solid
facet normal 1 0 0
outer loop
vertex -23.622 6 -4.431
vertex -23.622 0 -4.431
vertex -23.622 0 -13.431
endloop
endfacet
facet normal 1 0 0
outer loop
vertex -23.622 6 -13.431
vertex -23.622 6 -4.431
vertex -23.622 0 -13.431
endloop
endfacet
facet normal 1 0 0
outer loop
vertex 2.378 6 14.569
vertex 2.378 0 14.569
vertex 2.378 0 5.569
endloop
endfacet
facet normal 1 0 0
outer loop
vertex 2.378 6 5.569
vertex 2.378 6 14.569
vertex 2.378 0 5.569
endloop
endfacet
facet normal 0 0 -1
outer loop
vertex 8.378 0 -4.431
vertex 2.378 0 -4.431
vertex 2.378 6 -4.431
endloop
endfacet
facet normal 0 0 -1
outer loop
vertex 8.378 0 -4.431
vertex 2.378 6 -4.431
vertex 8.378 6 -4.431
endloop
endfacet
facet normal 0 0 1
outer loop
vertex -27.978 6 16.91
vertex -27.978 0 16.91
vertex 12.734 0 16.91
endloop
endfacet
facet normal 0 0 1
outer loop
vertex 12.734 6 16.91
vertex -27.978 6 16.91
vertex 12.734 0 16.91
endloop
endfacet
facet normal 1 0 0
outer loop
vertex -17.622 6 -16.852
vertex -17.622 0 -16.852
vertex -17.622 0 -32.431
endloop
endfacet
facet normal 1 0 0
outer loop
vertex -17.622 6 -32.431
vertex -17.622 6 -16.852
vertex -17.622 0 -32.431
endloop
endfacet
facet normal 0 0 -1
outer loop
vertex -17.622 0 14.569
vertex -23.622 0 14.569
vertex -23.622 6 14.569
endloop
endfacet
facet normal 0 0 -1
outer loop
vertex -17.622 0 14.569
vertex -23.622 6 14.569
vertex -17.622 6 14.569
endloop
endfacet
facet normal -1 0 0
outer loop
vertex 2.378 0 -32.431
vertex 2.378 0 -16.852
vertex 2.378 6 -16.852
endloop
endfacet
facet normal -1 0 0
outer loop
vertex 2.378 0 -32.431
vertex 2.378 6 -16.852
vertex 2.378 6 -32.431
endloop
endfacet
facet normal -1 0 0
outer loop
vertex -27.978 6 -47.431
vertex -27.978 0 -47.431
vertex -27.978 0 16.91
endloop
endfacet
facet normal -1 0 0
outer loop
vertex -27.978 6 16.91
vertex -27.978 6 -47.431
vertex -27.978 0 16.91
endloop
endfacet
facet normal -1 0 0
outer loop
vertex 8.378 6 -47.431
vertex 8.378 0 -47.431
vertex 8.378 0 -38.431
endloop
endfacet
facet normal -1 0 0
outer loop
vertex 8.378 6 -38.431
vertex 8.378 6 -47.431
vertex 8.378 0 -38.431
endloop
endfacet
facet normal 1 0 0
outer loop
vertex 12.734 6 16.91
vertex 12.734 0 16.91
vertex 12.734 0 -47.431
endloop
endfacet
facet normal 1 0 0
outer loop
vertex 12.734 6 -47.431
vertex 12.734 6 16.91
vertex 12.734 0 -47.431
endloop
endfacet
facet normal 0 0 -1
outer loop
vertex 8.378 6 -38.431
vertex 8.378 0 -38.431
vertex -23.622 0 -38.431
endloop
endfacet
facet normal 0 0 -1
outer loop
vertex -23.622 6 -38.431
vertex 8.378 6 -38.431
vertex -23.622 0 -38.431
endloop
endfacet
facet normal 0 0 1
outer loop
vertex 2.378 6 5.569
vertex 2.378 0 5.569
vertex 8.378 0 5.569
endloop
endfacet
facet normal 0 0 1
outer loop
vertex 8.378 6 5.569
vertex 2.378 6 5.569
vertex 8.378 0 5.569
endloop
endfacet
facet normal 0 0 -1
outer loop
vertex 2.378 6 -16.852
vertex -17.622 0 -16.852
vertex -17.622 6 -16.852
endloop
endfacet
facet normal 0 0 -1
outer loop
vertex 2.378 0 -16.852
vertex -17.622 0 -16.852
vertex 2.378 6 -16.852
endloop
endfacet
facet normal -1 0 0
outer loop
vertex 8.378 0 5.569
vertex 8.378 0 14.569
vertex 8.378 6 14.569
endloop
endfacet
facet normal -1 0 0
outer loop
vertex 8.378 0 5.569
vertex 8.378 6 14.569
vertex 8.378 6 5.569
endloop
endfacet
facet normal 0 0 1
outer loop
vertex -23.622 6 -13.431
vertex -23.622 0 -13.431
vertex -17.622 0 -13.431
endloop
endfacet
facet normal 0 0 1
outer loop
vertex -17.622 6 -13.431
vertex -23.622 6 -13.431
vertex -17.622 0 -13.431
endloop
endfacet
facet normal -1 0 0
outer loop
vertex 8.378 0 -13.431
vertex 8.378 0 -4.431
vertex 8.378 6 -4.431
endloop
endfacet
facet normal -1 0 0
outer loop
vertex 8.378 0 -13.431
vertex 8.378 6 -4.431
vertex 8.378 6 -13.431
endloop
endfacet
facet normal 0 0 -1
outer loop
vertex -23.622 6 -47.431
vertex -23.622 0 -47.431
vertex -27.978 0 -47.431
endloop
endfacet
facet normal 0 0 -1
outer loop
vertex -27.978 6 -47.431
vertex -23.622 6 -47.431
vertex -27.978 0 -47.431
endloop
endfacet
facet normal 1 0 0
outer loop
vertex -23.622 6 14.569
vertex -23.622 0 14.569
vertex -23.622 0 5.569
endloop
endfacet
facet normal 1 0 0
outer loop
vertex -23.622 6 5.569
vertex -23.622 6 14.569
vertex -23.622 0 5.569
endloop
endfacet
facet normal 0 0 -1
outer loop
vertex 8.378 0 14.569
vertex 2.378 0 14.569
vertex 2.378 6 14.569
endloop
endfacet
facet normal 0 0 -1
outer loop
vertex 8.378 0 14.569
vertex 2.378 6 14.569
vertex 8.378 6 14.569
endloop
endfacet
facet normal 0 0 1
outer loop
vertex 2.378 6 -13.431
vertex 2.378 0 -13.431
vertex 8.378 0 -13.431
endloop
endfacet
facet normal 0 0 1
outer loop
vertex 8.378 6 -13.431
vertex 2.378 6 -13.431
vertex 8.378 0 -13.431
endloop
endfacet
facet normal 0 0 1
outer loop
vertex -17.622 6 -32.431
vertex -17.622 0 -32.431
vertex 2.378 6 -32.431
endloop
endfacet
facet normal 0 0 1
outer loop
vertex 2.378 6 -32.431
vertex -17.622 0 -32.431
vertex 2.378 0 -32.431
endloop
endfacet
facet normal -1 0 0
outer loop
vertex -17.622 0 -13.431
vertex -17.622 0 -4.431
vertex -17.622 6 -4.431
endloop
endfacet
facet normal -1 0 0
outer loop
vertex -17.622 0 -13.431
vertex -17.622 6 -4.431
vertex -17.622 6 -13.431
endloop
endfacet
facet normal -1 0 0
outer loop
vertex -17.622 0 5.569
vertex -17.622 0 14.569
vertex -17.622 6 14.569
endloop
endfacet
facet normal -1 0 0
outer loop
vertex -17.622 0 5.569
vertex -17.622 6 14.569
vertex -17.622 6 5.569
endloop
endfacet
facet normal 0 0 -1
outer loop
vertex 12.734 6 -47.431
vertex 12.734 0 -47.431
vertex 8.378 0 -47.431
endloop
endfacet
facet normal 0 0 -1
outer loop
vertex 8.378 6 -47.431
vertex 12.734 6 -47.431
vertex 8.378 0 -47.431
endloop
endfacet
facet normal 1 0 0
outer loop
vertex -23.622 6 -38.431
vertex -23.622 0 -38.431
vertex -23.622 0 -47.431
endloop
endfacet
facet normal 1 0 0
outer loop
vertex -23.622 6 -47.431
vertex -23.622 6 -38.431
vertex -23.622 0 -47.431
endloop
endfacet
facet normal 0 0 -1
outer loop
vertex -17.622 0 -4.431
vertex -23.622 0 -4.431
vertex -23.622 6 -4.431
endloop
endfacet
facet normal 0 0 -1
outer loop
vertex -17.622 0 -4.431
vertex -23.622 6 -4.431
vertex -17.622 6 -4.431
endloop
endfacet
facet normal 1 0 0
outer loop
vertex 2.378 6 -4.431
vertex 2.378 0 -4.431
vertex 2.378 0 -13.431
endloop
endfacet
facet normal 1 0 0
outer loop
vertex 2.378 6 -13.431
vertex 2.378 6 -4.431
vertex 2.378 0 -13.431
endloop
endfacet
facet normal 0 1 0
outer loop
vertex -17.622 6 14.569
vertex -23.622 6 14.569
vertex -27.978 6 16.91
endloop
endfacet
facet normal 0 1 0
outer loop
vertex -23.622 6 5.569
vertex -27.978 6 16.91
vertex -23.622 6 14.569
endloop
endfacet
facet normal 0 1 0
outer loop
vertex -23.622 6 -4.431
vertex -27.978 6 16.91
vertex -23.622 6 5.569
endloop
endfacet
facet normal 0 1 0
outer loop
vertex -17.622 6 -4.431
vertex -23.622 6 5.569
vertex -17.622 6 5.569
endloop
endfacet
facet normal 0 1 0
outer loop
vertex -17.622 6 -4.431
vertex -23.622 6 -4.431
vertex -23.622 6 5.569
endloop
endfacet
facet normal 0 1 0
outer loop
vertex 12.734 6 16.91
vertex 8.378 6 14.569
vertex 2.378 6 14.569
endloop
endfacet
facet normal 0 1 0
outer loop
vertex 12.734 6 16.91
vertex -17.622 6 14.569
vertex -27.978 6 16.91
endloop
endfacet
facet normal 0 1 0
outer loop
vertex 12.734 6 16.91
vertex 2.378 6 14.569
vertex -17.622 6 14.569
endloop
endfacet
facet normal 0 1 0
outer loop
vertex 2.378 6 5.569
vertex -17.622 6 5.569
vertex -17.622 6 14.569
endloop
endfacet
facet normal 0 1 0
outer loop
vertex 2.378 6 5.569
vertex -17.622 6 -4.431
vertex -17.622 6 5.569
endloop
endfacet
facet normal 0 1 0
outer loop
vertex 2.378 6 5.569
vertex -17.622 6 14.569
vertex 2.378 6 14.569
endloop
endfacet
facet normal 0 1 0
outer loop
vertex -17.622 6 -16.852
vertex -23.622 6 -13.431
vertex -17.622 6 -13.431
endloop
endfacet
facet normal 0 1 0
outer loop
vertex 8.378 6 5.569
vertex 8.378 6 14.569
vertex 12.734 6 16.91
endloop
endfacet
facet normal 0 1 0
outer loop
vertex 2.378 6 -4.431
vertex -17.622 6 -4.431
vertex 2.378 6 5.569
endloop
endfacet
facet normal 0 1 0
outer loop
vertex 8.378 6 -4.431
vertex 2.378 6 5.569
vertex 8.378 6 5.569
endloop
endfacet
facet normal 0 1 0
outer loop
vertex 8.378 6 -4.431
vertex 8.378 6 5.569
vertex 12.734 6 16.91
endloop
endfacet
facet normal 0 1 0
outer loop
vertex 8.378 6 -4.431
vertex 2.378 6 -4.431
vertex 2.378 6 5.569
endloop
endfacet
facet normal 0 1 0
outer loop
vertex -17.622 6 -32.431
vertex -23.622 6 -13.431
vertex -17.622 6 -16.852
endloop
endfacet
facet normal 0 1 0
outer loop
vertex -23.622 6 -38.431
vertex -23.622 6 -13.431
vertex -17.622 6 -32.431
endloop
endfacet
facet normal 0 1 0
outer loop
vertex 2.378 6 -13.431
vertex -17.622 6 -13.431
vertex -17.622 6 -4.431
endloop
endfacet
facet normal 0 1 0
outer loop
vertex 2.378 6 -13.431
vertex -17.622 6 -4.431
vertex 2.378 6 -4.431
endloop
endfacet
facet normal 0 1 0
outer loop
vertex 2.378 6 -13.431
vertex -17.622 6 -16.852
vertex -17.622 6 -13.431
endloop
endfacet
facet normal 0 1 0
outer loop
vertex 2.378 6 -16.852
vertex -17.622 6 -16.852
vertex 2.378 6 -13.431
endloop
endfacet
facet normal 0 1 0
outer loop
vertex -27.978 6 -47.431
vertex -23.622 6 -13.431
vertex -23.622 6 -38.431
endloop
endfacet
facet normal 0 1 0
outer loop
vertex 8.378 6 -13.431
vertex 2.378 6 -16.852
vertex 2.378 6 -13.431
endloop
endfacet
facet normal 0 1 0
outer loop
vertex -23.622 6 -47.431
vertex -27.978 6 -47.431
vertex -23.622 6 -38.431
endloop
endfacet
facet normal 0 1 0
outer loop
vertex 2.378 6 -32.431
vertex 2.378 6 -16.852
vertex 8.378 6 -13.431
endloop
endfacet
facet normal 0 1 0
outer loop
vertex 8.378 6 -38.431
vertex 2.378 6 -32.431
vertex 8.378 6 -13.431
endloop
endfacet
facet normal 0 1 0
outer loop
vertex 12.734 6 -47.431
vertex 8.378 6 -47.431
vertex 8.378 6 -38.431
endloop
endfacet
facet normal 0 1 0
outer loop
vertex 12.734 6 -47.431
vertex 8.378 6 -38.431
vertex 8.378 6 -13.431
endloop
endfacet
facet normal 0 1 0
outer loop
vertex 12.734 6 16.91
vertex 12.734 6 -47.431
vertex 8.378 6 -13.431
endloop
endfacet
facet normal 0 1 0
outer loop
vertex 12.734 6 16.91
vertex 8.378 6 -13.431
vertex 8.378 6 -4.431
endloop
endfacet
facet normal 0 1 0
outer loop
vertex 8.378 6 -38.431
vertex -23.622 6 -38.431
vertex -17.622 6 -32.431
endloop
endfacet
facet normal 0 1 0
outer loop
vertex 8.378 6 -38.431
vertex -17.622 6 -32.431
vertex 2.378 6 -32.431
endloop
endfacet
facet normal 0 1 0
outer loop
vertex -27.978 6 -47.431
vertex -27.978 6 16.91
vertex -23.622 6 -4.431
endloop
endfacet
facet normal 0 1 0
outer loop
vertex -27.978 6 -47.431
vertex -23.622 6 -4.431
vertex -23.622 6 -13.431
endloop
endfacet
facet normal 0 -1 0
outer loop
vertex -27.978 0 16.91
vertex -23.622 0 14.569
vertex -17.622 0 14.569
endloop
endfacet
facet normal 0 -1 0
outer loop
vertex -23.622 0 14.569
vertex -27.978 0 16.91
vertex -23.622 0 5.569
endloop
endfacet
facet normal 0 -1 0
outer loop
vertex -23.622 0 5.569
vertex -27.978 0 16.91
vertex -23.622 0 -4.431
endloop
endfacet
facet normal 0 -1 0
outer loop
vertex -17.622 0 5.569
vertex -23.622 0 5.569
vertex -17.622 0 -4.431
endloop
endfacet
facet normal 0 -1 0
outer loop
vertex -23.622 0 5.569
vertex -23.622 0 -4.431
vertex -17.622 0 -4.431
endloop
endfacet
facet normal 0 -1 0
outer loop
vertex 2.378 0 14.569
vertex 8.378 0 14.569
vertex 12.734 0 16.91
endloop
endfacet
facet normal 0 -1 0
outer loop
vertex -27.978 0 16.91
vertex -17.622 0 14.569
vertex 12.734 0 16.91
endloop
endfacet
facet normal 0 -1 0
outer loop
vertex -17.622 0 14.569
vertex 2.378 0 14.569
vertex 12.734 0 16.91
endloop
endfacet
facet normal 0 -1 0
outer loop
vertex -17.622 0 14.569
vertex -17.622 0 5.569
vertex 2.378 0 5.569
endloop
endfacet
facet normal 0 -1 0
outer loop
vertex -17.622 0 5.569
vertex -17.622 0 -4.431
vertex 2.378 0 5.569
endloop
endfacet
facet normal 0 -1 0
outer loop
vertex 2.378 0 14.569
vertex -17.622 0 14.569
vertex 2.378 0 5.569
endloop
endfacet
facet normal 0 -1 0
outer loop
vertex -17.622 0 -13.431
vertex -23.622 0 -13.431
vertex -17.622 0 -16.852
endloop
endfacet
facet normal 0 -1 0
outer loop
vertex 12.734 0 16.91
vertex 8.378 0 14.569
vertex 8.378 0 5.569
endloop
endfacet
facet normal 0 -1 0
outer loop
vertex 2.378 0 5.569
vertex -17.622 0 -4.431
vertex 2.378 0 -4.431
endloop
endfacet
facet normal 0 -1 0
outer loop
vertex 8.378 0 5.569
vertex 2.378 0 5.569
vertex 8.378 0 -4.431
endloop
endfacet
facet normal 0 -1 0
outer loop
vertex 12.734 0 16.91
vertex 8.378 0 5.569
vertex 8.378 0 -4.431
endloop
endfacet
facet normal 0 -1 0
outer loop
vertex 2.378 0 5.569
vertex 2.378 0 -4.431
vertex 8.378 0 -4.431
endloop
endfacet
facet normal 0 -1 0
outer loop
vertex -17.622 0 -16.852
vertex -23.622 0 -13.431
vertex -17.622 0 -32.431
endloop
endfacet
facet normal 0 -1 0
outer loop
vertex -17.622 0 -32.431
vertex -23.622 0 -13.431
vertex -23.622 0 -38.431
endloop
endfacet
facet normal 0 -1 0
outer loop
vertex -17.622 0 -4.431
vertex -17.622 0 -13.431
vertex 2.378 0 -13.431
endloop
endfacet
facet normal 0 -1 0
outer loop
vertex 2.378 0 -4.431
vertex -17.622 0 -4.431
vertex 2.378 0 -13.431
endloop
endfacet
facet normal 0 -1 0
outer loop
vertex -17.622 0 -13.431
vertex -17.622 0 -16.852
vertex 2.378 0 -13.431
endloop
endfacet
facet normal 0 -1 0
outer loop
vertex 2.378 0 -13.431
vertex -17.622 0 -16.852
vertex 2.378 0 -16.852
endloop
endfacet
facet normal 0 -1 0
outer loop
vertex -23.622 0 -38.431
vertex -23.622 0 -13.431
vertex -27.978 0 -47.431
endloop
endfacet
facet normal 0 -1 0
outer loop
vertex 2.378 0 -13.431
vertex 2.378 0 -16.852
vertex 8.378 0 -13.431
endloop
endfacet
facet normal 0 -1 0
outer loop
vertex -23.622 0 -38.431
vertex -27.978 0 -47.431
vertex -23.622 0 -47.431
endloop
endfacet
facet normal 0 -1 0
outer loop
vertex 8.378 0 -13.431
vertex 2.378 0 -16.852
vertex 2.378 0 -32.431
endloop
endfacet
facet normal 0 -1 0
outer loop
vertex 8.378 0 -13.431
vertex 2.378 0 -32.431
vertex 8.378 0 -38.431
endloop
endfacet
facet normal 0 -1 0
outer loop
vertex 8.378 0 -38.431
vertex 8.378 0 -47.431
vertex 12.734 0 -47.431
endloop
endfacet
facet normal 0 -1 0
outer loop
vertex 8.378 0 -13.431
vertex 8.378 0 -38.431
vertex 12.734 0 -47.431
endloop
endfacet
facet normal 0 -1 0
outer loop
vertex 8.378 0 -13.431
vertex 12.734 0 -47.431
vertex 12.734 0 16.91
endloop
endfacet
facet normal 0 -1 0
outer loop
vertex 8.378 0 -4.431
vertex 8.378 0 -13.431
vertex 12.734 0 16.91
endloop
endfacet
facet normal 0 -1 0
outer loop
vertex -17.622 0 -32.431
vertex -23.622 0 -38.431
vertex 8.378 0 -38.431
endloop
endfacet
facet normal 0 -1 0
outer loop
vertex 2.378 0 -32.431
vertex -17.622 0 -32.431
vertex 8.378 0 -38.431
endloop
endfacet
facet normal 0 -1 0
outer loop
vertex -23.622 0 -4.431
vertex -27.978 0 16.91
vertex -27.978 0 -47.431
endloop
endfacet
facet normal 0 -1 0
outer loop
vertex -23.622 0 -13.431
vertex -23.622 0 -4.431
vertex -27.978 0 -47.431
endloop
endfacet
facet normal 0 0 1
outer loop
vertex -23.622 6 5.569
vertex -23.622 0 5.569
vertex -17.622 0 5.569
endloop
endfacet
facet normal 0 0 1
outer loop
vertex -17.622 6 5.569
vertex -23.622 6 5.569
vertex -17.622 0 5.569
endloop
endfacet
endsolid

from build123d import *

# Parameters (mm, degrees)
SKETCH1_W           = 6
SKETCH1_H           = 9
SKETCH1_W_2         = 20
SKETCH1_H_2         = 15.579203612
BOSS_EXTRUDE1_DEPTH = 6


with BuildPart() as part:
    # Sketch1 → Boss-Extrude1 (new body)
    with BuildSketch(Plane(origin=(0, 0, 0), x_dir=(1, 0, 0), z_dir=(0, 1, 0))):
        Polygon((-27.97781142, 17.579932433), (-27.97781142, -16.909955783), (12.733891313, -16.909955783), (12.733891313, 17.579932433), (12.733891313, 38.430995495), (12.733891313, 47.430995495), (8.378039947, 47.430995495), (8.378039947, 38.430995495), (-23.621960053, 38.430995495), (-23.621960053, 47.430995495), (-27.97781142, 47.430995495), (-27.97781142, 38.430995495), align=None)
        with Locations((5.378039947, 8.930995495)):
            Rectangle(SKETCH1_W, SKETCH1_H, mode=Mode.SUBTRACT)
        with Locations((5.378039947, -10.069004505)):
            Rectangle(SKETCH1_W, SKETCH1_H, mode=Mode.SUBTRACT)
        with Locations((-20.621960053, 8.930995495)):
            Rectangle(SKETCH1_W, SKETCH1_H, mode=Mode.SUBTRACT)
        with Locations((-20.621960053, -10.069004505)):
            Rectangle(SKETCH1_W, SKETCH1_H, mode=Mode.SUBTRACT)
        with Locations((-7.621960053, 24.641393689)):
            Rectangle(SKETCH1_W_2, SKETCH1_H_2, mode=Mode.SUBTRACT)
    extrude(amount=BOSS_EXTRUDE1_DEPTH)


solid = part.part
